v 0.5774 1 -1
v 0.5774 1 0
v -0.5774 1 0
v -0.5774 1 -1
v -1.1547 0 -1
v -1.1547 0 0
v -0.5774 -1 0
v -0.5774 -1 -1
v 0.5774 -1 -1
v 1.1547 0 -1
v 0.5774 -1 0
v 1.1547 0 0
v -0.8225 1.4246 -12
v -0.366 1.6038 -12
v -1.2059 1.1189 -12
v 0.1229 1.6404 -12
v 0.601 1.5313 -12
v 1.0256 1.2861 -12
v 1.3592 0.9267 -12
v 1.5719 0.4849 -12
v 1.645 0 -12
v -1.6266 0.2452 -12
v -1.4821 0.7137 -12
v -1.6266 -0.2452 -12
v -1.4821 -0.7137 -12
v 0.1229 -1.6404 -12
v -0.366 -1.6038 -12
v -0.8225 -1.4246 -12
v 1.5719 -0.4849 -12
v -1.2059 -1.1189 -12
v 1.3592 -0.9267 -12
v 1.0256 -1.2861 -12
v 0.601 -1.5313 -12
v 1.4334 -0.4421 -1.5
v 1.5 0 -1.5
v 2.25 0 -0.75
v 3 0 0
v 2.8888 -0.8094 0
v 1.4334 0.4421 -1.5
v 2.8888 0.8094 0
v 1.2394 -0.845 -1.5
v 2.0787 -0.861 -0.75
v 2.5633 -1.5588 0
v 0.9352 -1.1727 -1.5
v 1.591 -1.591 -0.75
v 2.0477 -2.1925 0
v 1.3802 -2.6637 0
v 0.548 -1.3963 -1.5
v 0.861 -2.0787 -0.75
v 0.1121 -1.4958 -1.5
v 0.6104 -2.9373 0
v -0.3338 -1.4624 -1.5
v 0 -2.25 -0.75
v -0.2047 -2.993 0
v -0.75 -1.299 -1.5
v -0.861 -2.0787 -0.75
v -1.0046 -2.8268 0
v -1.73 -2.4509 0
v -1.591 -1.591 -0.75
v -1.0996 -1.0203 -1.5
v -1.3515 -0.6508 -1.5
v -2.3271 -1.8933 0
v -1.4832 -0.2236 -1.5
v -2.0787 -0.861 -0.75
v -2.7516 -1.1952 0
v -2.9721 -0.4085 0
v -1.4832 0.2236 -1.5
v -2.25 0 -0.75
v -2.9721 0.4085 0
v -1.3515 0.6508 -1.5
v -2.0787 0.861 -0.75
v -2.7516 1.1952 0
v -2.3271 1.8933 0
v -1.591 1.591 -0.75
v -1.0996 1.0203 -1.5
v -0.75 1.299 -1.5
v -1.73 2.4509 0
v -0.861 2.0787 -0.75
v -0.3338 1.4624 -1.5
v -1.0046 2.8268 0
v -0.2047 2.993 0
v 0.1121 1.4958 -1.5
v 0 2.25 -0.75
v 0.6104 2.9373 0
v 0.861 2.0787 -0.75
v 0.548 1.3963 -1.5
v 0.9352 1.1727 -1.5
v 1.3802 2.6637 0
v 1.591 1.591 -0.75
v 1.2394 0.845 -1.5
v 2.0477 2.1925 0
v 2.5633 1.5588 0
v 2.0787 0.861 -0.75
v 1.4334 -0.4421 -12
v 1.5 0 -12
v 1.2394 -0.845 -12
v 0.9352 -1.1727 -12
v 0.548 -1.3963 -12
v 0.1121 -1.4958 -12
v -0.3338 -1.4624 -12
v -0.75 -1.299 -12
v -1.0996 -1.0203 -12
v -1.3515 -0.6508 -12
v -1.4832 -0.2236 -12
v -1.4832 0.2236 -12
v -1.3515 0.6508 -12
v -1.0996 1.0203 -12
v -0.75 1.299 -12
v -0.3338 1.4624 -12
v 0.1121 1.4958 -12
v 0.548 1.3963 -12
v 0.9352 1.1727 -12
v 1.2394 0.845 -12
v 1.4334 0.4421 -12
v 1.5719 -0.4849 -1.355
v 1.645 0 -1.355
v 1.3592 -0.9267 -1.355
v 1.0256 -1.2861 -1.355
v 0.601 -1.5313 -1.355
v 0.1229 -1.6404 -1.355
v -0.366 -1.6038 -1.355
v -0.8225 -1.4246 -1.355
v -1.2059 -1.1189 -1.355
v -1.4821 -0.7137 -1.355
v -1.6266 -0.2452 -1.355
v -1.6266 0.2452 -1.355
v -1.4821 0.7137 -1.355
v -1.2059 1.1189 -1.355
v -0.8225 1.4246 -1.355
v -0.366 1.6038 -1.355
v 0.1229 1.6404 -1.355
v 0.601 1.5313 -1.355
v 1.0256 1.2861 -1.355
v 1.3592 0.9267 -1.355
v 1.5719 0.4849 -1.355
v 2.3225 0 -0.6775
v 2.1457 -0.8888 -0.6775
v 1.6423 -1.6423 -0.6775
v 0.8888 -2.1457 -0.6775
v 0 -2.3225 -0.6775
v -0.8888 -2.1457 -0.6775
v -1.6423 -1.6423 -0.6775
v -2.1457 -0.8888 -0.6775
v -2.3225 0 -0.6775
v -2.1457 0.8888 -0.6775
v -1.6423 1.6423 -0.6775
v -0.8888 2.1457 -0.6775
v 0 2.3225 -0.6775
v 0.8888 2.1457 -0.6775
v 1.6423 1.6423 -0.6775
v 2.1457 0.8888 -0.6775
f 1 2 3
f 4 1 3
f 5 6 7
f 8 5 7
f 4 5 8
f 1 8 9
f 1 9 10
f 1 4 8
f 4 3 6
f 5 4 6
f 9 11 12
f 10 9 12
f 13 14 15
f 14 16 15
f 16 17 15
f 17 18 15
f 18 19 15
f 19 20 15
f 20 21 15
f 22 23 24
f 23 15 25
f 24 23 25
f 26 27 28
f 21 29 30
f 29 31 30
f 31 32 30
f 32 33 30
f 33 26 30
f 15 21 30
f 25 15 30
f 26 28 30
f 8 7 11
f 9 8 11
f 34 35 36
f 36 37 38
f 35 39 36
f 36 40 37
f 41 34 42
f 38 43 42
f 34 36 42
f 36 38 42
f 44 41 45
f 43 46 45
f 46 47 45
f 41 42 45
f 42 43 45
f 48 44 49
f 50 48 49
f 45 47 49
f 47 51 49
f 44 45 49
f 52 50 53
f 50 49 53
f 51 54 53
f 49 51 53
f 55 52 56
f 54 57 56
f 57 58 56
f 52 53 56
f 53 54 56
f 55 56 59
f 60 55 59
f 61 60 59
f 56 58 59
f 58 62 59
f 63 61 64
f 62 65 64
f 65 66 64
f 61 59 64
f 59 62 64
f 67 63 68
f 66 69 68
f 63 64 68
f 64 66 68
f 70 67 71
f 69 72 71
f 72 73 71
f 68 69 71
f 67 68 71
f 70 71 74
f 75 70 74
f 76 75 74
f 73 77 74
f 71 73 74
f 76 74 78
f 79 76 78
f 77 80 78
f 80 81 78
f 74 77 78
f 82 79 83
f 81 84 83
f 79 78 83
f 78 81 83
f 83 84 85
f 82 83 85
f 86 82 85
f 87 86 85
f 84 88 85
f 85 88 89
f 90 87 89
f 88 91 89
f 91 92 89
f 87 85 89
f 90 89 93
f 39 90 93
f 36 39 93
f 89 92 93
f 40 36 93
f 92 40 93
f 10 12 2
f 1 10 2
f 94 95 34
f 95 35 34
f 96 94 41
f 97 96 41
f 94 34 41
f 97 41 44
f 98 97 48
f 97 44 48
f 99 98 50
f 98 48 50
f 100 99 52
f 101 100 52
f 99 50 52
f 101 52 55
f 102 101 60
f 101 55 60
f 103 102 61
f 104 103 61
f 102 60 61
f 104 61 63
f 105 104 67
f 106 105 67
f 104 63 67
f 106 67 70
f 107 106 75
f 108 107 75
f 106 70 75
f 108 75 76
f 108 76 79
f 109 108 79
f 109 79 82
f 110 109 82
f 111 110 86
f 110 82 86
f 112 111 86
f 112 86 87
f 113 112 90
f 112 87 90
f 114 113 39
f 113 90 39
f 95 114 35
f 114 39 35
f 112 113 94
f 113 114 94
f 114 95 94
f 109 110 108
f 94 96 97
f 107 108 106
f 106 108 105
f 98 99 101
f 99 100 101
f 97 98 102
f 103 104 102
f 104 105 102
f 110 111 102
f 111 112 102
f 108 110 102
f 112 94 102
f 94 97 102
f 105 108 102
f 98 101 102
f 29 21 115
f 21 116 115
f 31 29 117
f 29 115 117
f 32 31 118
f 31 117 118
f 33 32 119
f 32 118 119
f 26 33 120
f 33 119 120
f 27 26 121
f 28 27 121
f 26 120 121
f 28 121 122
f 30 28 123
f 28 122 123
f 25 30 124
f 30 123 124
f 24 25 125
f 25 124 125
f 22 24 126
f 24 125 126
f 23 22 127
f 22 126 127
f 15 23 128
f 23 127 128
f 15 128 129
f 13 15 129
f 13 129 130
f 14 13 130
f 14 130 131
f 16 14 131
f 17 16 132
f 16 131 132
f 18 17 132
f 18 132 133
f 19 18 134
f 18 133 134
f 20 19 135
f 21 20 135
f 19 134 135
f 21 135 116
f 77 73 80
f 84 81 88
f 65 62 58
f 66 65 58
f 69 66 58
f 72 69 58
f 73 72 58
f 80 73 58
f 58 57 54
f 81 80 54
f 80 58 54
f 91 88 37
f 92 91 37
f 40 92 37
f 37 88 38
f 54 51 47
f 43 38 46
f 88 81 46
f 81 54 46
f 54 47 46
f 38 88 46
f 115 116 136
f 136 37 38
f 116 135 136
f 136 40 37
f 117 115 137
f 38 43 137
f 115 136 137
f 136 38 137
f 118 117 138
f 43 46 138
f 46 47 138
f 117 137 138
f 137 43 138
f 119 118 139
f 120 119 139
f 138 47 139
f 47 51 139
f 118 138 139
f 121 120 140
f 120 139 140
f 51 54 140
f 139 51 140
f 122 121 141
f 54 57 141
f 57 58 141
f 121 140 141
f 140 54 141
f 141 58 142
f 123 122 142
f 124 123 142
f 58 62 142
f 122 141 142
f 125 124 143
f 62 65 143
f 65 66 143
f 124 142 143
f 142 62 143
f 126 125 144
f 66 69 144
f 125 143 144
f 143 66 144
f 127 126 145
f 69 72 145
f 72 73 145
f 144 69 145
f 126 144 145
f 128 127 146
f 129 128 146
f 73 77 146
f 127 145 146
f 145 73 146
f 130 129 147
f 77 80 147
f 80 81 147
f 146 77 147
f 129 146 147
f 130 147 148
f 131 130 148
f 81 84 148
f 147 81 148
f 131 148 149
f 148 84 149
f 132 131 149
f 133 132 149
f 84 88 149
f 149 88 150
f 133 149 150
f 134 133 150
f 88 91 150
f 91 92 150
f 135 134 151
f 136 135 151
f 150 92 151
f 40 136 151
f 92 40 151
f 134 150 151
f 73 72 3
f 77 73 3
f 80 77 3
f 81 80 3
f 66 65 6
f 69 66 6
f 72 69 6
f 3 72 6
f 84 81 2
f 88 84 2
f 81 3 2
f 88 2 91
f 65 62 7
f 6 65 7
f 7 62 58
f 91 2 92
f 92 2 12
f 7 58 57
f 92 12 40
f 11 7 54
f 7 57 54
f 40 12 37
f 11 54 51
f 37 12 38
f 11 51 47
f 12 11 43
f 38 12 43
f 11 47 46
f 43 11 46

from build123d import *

# Parameters (mm, degrees)
F3_DEPTH = 1


with BuildPart() as f2:
    # F1 (on Front) → F2 (revolve)
    with BuildSketch(Plane.XZ):
        Polygon((3, 0), (1.5, 0), (1.5, -1.5), (1.645, -1.355), align=None)
        Polygon((1.5, 0), (0, 0), (0, -3), (1.5, -1.5), align=None)
        Polygon((1.5, -1.5), (0, -3), (0, -12), (1.5, -12), align=None)
    revolve(axis=Axis((0, 0, -6), (0, 0, -1)))

    # F0 (on Top) → F3 (cut)
    with BuildSketch(Plane.XY):
        Polygon((0.5773502692, 1), (-0.5773502692, 1), (-1.1547005384, 0), (-0.5773502692, -1), (0.5773502692, -1), (1.1547005384, 0), align=None)
    extrude(amount=-F3_DEPTH, mode=Mode.SUBTRACT)


with BuildPart() as f4:
    # F1 (on Front) → F4 (revolve)
    with BuildSketch(Plane.XZ):
        Polygon((1.5, -1.5), (0, -3), (0, -12), (1.5, -12), align=None)
        Polygon((1.5, 0), (0, 0), (0, -3), (1.5, -1.5), align=None)
        Polygon((3, 0), (1.5, 0), (1.5, -1.5), (1.645, -1.355), align=None)
        Polygon((1.645, -1.355), (1.5, -1.5), (1.5, -12), (1.645, -12), align=None)
    revolve(axis=Axis((0, 0, -6), (0, 0, -1)))


solid = Compound([f2.part, f4.part])
